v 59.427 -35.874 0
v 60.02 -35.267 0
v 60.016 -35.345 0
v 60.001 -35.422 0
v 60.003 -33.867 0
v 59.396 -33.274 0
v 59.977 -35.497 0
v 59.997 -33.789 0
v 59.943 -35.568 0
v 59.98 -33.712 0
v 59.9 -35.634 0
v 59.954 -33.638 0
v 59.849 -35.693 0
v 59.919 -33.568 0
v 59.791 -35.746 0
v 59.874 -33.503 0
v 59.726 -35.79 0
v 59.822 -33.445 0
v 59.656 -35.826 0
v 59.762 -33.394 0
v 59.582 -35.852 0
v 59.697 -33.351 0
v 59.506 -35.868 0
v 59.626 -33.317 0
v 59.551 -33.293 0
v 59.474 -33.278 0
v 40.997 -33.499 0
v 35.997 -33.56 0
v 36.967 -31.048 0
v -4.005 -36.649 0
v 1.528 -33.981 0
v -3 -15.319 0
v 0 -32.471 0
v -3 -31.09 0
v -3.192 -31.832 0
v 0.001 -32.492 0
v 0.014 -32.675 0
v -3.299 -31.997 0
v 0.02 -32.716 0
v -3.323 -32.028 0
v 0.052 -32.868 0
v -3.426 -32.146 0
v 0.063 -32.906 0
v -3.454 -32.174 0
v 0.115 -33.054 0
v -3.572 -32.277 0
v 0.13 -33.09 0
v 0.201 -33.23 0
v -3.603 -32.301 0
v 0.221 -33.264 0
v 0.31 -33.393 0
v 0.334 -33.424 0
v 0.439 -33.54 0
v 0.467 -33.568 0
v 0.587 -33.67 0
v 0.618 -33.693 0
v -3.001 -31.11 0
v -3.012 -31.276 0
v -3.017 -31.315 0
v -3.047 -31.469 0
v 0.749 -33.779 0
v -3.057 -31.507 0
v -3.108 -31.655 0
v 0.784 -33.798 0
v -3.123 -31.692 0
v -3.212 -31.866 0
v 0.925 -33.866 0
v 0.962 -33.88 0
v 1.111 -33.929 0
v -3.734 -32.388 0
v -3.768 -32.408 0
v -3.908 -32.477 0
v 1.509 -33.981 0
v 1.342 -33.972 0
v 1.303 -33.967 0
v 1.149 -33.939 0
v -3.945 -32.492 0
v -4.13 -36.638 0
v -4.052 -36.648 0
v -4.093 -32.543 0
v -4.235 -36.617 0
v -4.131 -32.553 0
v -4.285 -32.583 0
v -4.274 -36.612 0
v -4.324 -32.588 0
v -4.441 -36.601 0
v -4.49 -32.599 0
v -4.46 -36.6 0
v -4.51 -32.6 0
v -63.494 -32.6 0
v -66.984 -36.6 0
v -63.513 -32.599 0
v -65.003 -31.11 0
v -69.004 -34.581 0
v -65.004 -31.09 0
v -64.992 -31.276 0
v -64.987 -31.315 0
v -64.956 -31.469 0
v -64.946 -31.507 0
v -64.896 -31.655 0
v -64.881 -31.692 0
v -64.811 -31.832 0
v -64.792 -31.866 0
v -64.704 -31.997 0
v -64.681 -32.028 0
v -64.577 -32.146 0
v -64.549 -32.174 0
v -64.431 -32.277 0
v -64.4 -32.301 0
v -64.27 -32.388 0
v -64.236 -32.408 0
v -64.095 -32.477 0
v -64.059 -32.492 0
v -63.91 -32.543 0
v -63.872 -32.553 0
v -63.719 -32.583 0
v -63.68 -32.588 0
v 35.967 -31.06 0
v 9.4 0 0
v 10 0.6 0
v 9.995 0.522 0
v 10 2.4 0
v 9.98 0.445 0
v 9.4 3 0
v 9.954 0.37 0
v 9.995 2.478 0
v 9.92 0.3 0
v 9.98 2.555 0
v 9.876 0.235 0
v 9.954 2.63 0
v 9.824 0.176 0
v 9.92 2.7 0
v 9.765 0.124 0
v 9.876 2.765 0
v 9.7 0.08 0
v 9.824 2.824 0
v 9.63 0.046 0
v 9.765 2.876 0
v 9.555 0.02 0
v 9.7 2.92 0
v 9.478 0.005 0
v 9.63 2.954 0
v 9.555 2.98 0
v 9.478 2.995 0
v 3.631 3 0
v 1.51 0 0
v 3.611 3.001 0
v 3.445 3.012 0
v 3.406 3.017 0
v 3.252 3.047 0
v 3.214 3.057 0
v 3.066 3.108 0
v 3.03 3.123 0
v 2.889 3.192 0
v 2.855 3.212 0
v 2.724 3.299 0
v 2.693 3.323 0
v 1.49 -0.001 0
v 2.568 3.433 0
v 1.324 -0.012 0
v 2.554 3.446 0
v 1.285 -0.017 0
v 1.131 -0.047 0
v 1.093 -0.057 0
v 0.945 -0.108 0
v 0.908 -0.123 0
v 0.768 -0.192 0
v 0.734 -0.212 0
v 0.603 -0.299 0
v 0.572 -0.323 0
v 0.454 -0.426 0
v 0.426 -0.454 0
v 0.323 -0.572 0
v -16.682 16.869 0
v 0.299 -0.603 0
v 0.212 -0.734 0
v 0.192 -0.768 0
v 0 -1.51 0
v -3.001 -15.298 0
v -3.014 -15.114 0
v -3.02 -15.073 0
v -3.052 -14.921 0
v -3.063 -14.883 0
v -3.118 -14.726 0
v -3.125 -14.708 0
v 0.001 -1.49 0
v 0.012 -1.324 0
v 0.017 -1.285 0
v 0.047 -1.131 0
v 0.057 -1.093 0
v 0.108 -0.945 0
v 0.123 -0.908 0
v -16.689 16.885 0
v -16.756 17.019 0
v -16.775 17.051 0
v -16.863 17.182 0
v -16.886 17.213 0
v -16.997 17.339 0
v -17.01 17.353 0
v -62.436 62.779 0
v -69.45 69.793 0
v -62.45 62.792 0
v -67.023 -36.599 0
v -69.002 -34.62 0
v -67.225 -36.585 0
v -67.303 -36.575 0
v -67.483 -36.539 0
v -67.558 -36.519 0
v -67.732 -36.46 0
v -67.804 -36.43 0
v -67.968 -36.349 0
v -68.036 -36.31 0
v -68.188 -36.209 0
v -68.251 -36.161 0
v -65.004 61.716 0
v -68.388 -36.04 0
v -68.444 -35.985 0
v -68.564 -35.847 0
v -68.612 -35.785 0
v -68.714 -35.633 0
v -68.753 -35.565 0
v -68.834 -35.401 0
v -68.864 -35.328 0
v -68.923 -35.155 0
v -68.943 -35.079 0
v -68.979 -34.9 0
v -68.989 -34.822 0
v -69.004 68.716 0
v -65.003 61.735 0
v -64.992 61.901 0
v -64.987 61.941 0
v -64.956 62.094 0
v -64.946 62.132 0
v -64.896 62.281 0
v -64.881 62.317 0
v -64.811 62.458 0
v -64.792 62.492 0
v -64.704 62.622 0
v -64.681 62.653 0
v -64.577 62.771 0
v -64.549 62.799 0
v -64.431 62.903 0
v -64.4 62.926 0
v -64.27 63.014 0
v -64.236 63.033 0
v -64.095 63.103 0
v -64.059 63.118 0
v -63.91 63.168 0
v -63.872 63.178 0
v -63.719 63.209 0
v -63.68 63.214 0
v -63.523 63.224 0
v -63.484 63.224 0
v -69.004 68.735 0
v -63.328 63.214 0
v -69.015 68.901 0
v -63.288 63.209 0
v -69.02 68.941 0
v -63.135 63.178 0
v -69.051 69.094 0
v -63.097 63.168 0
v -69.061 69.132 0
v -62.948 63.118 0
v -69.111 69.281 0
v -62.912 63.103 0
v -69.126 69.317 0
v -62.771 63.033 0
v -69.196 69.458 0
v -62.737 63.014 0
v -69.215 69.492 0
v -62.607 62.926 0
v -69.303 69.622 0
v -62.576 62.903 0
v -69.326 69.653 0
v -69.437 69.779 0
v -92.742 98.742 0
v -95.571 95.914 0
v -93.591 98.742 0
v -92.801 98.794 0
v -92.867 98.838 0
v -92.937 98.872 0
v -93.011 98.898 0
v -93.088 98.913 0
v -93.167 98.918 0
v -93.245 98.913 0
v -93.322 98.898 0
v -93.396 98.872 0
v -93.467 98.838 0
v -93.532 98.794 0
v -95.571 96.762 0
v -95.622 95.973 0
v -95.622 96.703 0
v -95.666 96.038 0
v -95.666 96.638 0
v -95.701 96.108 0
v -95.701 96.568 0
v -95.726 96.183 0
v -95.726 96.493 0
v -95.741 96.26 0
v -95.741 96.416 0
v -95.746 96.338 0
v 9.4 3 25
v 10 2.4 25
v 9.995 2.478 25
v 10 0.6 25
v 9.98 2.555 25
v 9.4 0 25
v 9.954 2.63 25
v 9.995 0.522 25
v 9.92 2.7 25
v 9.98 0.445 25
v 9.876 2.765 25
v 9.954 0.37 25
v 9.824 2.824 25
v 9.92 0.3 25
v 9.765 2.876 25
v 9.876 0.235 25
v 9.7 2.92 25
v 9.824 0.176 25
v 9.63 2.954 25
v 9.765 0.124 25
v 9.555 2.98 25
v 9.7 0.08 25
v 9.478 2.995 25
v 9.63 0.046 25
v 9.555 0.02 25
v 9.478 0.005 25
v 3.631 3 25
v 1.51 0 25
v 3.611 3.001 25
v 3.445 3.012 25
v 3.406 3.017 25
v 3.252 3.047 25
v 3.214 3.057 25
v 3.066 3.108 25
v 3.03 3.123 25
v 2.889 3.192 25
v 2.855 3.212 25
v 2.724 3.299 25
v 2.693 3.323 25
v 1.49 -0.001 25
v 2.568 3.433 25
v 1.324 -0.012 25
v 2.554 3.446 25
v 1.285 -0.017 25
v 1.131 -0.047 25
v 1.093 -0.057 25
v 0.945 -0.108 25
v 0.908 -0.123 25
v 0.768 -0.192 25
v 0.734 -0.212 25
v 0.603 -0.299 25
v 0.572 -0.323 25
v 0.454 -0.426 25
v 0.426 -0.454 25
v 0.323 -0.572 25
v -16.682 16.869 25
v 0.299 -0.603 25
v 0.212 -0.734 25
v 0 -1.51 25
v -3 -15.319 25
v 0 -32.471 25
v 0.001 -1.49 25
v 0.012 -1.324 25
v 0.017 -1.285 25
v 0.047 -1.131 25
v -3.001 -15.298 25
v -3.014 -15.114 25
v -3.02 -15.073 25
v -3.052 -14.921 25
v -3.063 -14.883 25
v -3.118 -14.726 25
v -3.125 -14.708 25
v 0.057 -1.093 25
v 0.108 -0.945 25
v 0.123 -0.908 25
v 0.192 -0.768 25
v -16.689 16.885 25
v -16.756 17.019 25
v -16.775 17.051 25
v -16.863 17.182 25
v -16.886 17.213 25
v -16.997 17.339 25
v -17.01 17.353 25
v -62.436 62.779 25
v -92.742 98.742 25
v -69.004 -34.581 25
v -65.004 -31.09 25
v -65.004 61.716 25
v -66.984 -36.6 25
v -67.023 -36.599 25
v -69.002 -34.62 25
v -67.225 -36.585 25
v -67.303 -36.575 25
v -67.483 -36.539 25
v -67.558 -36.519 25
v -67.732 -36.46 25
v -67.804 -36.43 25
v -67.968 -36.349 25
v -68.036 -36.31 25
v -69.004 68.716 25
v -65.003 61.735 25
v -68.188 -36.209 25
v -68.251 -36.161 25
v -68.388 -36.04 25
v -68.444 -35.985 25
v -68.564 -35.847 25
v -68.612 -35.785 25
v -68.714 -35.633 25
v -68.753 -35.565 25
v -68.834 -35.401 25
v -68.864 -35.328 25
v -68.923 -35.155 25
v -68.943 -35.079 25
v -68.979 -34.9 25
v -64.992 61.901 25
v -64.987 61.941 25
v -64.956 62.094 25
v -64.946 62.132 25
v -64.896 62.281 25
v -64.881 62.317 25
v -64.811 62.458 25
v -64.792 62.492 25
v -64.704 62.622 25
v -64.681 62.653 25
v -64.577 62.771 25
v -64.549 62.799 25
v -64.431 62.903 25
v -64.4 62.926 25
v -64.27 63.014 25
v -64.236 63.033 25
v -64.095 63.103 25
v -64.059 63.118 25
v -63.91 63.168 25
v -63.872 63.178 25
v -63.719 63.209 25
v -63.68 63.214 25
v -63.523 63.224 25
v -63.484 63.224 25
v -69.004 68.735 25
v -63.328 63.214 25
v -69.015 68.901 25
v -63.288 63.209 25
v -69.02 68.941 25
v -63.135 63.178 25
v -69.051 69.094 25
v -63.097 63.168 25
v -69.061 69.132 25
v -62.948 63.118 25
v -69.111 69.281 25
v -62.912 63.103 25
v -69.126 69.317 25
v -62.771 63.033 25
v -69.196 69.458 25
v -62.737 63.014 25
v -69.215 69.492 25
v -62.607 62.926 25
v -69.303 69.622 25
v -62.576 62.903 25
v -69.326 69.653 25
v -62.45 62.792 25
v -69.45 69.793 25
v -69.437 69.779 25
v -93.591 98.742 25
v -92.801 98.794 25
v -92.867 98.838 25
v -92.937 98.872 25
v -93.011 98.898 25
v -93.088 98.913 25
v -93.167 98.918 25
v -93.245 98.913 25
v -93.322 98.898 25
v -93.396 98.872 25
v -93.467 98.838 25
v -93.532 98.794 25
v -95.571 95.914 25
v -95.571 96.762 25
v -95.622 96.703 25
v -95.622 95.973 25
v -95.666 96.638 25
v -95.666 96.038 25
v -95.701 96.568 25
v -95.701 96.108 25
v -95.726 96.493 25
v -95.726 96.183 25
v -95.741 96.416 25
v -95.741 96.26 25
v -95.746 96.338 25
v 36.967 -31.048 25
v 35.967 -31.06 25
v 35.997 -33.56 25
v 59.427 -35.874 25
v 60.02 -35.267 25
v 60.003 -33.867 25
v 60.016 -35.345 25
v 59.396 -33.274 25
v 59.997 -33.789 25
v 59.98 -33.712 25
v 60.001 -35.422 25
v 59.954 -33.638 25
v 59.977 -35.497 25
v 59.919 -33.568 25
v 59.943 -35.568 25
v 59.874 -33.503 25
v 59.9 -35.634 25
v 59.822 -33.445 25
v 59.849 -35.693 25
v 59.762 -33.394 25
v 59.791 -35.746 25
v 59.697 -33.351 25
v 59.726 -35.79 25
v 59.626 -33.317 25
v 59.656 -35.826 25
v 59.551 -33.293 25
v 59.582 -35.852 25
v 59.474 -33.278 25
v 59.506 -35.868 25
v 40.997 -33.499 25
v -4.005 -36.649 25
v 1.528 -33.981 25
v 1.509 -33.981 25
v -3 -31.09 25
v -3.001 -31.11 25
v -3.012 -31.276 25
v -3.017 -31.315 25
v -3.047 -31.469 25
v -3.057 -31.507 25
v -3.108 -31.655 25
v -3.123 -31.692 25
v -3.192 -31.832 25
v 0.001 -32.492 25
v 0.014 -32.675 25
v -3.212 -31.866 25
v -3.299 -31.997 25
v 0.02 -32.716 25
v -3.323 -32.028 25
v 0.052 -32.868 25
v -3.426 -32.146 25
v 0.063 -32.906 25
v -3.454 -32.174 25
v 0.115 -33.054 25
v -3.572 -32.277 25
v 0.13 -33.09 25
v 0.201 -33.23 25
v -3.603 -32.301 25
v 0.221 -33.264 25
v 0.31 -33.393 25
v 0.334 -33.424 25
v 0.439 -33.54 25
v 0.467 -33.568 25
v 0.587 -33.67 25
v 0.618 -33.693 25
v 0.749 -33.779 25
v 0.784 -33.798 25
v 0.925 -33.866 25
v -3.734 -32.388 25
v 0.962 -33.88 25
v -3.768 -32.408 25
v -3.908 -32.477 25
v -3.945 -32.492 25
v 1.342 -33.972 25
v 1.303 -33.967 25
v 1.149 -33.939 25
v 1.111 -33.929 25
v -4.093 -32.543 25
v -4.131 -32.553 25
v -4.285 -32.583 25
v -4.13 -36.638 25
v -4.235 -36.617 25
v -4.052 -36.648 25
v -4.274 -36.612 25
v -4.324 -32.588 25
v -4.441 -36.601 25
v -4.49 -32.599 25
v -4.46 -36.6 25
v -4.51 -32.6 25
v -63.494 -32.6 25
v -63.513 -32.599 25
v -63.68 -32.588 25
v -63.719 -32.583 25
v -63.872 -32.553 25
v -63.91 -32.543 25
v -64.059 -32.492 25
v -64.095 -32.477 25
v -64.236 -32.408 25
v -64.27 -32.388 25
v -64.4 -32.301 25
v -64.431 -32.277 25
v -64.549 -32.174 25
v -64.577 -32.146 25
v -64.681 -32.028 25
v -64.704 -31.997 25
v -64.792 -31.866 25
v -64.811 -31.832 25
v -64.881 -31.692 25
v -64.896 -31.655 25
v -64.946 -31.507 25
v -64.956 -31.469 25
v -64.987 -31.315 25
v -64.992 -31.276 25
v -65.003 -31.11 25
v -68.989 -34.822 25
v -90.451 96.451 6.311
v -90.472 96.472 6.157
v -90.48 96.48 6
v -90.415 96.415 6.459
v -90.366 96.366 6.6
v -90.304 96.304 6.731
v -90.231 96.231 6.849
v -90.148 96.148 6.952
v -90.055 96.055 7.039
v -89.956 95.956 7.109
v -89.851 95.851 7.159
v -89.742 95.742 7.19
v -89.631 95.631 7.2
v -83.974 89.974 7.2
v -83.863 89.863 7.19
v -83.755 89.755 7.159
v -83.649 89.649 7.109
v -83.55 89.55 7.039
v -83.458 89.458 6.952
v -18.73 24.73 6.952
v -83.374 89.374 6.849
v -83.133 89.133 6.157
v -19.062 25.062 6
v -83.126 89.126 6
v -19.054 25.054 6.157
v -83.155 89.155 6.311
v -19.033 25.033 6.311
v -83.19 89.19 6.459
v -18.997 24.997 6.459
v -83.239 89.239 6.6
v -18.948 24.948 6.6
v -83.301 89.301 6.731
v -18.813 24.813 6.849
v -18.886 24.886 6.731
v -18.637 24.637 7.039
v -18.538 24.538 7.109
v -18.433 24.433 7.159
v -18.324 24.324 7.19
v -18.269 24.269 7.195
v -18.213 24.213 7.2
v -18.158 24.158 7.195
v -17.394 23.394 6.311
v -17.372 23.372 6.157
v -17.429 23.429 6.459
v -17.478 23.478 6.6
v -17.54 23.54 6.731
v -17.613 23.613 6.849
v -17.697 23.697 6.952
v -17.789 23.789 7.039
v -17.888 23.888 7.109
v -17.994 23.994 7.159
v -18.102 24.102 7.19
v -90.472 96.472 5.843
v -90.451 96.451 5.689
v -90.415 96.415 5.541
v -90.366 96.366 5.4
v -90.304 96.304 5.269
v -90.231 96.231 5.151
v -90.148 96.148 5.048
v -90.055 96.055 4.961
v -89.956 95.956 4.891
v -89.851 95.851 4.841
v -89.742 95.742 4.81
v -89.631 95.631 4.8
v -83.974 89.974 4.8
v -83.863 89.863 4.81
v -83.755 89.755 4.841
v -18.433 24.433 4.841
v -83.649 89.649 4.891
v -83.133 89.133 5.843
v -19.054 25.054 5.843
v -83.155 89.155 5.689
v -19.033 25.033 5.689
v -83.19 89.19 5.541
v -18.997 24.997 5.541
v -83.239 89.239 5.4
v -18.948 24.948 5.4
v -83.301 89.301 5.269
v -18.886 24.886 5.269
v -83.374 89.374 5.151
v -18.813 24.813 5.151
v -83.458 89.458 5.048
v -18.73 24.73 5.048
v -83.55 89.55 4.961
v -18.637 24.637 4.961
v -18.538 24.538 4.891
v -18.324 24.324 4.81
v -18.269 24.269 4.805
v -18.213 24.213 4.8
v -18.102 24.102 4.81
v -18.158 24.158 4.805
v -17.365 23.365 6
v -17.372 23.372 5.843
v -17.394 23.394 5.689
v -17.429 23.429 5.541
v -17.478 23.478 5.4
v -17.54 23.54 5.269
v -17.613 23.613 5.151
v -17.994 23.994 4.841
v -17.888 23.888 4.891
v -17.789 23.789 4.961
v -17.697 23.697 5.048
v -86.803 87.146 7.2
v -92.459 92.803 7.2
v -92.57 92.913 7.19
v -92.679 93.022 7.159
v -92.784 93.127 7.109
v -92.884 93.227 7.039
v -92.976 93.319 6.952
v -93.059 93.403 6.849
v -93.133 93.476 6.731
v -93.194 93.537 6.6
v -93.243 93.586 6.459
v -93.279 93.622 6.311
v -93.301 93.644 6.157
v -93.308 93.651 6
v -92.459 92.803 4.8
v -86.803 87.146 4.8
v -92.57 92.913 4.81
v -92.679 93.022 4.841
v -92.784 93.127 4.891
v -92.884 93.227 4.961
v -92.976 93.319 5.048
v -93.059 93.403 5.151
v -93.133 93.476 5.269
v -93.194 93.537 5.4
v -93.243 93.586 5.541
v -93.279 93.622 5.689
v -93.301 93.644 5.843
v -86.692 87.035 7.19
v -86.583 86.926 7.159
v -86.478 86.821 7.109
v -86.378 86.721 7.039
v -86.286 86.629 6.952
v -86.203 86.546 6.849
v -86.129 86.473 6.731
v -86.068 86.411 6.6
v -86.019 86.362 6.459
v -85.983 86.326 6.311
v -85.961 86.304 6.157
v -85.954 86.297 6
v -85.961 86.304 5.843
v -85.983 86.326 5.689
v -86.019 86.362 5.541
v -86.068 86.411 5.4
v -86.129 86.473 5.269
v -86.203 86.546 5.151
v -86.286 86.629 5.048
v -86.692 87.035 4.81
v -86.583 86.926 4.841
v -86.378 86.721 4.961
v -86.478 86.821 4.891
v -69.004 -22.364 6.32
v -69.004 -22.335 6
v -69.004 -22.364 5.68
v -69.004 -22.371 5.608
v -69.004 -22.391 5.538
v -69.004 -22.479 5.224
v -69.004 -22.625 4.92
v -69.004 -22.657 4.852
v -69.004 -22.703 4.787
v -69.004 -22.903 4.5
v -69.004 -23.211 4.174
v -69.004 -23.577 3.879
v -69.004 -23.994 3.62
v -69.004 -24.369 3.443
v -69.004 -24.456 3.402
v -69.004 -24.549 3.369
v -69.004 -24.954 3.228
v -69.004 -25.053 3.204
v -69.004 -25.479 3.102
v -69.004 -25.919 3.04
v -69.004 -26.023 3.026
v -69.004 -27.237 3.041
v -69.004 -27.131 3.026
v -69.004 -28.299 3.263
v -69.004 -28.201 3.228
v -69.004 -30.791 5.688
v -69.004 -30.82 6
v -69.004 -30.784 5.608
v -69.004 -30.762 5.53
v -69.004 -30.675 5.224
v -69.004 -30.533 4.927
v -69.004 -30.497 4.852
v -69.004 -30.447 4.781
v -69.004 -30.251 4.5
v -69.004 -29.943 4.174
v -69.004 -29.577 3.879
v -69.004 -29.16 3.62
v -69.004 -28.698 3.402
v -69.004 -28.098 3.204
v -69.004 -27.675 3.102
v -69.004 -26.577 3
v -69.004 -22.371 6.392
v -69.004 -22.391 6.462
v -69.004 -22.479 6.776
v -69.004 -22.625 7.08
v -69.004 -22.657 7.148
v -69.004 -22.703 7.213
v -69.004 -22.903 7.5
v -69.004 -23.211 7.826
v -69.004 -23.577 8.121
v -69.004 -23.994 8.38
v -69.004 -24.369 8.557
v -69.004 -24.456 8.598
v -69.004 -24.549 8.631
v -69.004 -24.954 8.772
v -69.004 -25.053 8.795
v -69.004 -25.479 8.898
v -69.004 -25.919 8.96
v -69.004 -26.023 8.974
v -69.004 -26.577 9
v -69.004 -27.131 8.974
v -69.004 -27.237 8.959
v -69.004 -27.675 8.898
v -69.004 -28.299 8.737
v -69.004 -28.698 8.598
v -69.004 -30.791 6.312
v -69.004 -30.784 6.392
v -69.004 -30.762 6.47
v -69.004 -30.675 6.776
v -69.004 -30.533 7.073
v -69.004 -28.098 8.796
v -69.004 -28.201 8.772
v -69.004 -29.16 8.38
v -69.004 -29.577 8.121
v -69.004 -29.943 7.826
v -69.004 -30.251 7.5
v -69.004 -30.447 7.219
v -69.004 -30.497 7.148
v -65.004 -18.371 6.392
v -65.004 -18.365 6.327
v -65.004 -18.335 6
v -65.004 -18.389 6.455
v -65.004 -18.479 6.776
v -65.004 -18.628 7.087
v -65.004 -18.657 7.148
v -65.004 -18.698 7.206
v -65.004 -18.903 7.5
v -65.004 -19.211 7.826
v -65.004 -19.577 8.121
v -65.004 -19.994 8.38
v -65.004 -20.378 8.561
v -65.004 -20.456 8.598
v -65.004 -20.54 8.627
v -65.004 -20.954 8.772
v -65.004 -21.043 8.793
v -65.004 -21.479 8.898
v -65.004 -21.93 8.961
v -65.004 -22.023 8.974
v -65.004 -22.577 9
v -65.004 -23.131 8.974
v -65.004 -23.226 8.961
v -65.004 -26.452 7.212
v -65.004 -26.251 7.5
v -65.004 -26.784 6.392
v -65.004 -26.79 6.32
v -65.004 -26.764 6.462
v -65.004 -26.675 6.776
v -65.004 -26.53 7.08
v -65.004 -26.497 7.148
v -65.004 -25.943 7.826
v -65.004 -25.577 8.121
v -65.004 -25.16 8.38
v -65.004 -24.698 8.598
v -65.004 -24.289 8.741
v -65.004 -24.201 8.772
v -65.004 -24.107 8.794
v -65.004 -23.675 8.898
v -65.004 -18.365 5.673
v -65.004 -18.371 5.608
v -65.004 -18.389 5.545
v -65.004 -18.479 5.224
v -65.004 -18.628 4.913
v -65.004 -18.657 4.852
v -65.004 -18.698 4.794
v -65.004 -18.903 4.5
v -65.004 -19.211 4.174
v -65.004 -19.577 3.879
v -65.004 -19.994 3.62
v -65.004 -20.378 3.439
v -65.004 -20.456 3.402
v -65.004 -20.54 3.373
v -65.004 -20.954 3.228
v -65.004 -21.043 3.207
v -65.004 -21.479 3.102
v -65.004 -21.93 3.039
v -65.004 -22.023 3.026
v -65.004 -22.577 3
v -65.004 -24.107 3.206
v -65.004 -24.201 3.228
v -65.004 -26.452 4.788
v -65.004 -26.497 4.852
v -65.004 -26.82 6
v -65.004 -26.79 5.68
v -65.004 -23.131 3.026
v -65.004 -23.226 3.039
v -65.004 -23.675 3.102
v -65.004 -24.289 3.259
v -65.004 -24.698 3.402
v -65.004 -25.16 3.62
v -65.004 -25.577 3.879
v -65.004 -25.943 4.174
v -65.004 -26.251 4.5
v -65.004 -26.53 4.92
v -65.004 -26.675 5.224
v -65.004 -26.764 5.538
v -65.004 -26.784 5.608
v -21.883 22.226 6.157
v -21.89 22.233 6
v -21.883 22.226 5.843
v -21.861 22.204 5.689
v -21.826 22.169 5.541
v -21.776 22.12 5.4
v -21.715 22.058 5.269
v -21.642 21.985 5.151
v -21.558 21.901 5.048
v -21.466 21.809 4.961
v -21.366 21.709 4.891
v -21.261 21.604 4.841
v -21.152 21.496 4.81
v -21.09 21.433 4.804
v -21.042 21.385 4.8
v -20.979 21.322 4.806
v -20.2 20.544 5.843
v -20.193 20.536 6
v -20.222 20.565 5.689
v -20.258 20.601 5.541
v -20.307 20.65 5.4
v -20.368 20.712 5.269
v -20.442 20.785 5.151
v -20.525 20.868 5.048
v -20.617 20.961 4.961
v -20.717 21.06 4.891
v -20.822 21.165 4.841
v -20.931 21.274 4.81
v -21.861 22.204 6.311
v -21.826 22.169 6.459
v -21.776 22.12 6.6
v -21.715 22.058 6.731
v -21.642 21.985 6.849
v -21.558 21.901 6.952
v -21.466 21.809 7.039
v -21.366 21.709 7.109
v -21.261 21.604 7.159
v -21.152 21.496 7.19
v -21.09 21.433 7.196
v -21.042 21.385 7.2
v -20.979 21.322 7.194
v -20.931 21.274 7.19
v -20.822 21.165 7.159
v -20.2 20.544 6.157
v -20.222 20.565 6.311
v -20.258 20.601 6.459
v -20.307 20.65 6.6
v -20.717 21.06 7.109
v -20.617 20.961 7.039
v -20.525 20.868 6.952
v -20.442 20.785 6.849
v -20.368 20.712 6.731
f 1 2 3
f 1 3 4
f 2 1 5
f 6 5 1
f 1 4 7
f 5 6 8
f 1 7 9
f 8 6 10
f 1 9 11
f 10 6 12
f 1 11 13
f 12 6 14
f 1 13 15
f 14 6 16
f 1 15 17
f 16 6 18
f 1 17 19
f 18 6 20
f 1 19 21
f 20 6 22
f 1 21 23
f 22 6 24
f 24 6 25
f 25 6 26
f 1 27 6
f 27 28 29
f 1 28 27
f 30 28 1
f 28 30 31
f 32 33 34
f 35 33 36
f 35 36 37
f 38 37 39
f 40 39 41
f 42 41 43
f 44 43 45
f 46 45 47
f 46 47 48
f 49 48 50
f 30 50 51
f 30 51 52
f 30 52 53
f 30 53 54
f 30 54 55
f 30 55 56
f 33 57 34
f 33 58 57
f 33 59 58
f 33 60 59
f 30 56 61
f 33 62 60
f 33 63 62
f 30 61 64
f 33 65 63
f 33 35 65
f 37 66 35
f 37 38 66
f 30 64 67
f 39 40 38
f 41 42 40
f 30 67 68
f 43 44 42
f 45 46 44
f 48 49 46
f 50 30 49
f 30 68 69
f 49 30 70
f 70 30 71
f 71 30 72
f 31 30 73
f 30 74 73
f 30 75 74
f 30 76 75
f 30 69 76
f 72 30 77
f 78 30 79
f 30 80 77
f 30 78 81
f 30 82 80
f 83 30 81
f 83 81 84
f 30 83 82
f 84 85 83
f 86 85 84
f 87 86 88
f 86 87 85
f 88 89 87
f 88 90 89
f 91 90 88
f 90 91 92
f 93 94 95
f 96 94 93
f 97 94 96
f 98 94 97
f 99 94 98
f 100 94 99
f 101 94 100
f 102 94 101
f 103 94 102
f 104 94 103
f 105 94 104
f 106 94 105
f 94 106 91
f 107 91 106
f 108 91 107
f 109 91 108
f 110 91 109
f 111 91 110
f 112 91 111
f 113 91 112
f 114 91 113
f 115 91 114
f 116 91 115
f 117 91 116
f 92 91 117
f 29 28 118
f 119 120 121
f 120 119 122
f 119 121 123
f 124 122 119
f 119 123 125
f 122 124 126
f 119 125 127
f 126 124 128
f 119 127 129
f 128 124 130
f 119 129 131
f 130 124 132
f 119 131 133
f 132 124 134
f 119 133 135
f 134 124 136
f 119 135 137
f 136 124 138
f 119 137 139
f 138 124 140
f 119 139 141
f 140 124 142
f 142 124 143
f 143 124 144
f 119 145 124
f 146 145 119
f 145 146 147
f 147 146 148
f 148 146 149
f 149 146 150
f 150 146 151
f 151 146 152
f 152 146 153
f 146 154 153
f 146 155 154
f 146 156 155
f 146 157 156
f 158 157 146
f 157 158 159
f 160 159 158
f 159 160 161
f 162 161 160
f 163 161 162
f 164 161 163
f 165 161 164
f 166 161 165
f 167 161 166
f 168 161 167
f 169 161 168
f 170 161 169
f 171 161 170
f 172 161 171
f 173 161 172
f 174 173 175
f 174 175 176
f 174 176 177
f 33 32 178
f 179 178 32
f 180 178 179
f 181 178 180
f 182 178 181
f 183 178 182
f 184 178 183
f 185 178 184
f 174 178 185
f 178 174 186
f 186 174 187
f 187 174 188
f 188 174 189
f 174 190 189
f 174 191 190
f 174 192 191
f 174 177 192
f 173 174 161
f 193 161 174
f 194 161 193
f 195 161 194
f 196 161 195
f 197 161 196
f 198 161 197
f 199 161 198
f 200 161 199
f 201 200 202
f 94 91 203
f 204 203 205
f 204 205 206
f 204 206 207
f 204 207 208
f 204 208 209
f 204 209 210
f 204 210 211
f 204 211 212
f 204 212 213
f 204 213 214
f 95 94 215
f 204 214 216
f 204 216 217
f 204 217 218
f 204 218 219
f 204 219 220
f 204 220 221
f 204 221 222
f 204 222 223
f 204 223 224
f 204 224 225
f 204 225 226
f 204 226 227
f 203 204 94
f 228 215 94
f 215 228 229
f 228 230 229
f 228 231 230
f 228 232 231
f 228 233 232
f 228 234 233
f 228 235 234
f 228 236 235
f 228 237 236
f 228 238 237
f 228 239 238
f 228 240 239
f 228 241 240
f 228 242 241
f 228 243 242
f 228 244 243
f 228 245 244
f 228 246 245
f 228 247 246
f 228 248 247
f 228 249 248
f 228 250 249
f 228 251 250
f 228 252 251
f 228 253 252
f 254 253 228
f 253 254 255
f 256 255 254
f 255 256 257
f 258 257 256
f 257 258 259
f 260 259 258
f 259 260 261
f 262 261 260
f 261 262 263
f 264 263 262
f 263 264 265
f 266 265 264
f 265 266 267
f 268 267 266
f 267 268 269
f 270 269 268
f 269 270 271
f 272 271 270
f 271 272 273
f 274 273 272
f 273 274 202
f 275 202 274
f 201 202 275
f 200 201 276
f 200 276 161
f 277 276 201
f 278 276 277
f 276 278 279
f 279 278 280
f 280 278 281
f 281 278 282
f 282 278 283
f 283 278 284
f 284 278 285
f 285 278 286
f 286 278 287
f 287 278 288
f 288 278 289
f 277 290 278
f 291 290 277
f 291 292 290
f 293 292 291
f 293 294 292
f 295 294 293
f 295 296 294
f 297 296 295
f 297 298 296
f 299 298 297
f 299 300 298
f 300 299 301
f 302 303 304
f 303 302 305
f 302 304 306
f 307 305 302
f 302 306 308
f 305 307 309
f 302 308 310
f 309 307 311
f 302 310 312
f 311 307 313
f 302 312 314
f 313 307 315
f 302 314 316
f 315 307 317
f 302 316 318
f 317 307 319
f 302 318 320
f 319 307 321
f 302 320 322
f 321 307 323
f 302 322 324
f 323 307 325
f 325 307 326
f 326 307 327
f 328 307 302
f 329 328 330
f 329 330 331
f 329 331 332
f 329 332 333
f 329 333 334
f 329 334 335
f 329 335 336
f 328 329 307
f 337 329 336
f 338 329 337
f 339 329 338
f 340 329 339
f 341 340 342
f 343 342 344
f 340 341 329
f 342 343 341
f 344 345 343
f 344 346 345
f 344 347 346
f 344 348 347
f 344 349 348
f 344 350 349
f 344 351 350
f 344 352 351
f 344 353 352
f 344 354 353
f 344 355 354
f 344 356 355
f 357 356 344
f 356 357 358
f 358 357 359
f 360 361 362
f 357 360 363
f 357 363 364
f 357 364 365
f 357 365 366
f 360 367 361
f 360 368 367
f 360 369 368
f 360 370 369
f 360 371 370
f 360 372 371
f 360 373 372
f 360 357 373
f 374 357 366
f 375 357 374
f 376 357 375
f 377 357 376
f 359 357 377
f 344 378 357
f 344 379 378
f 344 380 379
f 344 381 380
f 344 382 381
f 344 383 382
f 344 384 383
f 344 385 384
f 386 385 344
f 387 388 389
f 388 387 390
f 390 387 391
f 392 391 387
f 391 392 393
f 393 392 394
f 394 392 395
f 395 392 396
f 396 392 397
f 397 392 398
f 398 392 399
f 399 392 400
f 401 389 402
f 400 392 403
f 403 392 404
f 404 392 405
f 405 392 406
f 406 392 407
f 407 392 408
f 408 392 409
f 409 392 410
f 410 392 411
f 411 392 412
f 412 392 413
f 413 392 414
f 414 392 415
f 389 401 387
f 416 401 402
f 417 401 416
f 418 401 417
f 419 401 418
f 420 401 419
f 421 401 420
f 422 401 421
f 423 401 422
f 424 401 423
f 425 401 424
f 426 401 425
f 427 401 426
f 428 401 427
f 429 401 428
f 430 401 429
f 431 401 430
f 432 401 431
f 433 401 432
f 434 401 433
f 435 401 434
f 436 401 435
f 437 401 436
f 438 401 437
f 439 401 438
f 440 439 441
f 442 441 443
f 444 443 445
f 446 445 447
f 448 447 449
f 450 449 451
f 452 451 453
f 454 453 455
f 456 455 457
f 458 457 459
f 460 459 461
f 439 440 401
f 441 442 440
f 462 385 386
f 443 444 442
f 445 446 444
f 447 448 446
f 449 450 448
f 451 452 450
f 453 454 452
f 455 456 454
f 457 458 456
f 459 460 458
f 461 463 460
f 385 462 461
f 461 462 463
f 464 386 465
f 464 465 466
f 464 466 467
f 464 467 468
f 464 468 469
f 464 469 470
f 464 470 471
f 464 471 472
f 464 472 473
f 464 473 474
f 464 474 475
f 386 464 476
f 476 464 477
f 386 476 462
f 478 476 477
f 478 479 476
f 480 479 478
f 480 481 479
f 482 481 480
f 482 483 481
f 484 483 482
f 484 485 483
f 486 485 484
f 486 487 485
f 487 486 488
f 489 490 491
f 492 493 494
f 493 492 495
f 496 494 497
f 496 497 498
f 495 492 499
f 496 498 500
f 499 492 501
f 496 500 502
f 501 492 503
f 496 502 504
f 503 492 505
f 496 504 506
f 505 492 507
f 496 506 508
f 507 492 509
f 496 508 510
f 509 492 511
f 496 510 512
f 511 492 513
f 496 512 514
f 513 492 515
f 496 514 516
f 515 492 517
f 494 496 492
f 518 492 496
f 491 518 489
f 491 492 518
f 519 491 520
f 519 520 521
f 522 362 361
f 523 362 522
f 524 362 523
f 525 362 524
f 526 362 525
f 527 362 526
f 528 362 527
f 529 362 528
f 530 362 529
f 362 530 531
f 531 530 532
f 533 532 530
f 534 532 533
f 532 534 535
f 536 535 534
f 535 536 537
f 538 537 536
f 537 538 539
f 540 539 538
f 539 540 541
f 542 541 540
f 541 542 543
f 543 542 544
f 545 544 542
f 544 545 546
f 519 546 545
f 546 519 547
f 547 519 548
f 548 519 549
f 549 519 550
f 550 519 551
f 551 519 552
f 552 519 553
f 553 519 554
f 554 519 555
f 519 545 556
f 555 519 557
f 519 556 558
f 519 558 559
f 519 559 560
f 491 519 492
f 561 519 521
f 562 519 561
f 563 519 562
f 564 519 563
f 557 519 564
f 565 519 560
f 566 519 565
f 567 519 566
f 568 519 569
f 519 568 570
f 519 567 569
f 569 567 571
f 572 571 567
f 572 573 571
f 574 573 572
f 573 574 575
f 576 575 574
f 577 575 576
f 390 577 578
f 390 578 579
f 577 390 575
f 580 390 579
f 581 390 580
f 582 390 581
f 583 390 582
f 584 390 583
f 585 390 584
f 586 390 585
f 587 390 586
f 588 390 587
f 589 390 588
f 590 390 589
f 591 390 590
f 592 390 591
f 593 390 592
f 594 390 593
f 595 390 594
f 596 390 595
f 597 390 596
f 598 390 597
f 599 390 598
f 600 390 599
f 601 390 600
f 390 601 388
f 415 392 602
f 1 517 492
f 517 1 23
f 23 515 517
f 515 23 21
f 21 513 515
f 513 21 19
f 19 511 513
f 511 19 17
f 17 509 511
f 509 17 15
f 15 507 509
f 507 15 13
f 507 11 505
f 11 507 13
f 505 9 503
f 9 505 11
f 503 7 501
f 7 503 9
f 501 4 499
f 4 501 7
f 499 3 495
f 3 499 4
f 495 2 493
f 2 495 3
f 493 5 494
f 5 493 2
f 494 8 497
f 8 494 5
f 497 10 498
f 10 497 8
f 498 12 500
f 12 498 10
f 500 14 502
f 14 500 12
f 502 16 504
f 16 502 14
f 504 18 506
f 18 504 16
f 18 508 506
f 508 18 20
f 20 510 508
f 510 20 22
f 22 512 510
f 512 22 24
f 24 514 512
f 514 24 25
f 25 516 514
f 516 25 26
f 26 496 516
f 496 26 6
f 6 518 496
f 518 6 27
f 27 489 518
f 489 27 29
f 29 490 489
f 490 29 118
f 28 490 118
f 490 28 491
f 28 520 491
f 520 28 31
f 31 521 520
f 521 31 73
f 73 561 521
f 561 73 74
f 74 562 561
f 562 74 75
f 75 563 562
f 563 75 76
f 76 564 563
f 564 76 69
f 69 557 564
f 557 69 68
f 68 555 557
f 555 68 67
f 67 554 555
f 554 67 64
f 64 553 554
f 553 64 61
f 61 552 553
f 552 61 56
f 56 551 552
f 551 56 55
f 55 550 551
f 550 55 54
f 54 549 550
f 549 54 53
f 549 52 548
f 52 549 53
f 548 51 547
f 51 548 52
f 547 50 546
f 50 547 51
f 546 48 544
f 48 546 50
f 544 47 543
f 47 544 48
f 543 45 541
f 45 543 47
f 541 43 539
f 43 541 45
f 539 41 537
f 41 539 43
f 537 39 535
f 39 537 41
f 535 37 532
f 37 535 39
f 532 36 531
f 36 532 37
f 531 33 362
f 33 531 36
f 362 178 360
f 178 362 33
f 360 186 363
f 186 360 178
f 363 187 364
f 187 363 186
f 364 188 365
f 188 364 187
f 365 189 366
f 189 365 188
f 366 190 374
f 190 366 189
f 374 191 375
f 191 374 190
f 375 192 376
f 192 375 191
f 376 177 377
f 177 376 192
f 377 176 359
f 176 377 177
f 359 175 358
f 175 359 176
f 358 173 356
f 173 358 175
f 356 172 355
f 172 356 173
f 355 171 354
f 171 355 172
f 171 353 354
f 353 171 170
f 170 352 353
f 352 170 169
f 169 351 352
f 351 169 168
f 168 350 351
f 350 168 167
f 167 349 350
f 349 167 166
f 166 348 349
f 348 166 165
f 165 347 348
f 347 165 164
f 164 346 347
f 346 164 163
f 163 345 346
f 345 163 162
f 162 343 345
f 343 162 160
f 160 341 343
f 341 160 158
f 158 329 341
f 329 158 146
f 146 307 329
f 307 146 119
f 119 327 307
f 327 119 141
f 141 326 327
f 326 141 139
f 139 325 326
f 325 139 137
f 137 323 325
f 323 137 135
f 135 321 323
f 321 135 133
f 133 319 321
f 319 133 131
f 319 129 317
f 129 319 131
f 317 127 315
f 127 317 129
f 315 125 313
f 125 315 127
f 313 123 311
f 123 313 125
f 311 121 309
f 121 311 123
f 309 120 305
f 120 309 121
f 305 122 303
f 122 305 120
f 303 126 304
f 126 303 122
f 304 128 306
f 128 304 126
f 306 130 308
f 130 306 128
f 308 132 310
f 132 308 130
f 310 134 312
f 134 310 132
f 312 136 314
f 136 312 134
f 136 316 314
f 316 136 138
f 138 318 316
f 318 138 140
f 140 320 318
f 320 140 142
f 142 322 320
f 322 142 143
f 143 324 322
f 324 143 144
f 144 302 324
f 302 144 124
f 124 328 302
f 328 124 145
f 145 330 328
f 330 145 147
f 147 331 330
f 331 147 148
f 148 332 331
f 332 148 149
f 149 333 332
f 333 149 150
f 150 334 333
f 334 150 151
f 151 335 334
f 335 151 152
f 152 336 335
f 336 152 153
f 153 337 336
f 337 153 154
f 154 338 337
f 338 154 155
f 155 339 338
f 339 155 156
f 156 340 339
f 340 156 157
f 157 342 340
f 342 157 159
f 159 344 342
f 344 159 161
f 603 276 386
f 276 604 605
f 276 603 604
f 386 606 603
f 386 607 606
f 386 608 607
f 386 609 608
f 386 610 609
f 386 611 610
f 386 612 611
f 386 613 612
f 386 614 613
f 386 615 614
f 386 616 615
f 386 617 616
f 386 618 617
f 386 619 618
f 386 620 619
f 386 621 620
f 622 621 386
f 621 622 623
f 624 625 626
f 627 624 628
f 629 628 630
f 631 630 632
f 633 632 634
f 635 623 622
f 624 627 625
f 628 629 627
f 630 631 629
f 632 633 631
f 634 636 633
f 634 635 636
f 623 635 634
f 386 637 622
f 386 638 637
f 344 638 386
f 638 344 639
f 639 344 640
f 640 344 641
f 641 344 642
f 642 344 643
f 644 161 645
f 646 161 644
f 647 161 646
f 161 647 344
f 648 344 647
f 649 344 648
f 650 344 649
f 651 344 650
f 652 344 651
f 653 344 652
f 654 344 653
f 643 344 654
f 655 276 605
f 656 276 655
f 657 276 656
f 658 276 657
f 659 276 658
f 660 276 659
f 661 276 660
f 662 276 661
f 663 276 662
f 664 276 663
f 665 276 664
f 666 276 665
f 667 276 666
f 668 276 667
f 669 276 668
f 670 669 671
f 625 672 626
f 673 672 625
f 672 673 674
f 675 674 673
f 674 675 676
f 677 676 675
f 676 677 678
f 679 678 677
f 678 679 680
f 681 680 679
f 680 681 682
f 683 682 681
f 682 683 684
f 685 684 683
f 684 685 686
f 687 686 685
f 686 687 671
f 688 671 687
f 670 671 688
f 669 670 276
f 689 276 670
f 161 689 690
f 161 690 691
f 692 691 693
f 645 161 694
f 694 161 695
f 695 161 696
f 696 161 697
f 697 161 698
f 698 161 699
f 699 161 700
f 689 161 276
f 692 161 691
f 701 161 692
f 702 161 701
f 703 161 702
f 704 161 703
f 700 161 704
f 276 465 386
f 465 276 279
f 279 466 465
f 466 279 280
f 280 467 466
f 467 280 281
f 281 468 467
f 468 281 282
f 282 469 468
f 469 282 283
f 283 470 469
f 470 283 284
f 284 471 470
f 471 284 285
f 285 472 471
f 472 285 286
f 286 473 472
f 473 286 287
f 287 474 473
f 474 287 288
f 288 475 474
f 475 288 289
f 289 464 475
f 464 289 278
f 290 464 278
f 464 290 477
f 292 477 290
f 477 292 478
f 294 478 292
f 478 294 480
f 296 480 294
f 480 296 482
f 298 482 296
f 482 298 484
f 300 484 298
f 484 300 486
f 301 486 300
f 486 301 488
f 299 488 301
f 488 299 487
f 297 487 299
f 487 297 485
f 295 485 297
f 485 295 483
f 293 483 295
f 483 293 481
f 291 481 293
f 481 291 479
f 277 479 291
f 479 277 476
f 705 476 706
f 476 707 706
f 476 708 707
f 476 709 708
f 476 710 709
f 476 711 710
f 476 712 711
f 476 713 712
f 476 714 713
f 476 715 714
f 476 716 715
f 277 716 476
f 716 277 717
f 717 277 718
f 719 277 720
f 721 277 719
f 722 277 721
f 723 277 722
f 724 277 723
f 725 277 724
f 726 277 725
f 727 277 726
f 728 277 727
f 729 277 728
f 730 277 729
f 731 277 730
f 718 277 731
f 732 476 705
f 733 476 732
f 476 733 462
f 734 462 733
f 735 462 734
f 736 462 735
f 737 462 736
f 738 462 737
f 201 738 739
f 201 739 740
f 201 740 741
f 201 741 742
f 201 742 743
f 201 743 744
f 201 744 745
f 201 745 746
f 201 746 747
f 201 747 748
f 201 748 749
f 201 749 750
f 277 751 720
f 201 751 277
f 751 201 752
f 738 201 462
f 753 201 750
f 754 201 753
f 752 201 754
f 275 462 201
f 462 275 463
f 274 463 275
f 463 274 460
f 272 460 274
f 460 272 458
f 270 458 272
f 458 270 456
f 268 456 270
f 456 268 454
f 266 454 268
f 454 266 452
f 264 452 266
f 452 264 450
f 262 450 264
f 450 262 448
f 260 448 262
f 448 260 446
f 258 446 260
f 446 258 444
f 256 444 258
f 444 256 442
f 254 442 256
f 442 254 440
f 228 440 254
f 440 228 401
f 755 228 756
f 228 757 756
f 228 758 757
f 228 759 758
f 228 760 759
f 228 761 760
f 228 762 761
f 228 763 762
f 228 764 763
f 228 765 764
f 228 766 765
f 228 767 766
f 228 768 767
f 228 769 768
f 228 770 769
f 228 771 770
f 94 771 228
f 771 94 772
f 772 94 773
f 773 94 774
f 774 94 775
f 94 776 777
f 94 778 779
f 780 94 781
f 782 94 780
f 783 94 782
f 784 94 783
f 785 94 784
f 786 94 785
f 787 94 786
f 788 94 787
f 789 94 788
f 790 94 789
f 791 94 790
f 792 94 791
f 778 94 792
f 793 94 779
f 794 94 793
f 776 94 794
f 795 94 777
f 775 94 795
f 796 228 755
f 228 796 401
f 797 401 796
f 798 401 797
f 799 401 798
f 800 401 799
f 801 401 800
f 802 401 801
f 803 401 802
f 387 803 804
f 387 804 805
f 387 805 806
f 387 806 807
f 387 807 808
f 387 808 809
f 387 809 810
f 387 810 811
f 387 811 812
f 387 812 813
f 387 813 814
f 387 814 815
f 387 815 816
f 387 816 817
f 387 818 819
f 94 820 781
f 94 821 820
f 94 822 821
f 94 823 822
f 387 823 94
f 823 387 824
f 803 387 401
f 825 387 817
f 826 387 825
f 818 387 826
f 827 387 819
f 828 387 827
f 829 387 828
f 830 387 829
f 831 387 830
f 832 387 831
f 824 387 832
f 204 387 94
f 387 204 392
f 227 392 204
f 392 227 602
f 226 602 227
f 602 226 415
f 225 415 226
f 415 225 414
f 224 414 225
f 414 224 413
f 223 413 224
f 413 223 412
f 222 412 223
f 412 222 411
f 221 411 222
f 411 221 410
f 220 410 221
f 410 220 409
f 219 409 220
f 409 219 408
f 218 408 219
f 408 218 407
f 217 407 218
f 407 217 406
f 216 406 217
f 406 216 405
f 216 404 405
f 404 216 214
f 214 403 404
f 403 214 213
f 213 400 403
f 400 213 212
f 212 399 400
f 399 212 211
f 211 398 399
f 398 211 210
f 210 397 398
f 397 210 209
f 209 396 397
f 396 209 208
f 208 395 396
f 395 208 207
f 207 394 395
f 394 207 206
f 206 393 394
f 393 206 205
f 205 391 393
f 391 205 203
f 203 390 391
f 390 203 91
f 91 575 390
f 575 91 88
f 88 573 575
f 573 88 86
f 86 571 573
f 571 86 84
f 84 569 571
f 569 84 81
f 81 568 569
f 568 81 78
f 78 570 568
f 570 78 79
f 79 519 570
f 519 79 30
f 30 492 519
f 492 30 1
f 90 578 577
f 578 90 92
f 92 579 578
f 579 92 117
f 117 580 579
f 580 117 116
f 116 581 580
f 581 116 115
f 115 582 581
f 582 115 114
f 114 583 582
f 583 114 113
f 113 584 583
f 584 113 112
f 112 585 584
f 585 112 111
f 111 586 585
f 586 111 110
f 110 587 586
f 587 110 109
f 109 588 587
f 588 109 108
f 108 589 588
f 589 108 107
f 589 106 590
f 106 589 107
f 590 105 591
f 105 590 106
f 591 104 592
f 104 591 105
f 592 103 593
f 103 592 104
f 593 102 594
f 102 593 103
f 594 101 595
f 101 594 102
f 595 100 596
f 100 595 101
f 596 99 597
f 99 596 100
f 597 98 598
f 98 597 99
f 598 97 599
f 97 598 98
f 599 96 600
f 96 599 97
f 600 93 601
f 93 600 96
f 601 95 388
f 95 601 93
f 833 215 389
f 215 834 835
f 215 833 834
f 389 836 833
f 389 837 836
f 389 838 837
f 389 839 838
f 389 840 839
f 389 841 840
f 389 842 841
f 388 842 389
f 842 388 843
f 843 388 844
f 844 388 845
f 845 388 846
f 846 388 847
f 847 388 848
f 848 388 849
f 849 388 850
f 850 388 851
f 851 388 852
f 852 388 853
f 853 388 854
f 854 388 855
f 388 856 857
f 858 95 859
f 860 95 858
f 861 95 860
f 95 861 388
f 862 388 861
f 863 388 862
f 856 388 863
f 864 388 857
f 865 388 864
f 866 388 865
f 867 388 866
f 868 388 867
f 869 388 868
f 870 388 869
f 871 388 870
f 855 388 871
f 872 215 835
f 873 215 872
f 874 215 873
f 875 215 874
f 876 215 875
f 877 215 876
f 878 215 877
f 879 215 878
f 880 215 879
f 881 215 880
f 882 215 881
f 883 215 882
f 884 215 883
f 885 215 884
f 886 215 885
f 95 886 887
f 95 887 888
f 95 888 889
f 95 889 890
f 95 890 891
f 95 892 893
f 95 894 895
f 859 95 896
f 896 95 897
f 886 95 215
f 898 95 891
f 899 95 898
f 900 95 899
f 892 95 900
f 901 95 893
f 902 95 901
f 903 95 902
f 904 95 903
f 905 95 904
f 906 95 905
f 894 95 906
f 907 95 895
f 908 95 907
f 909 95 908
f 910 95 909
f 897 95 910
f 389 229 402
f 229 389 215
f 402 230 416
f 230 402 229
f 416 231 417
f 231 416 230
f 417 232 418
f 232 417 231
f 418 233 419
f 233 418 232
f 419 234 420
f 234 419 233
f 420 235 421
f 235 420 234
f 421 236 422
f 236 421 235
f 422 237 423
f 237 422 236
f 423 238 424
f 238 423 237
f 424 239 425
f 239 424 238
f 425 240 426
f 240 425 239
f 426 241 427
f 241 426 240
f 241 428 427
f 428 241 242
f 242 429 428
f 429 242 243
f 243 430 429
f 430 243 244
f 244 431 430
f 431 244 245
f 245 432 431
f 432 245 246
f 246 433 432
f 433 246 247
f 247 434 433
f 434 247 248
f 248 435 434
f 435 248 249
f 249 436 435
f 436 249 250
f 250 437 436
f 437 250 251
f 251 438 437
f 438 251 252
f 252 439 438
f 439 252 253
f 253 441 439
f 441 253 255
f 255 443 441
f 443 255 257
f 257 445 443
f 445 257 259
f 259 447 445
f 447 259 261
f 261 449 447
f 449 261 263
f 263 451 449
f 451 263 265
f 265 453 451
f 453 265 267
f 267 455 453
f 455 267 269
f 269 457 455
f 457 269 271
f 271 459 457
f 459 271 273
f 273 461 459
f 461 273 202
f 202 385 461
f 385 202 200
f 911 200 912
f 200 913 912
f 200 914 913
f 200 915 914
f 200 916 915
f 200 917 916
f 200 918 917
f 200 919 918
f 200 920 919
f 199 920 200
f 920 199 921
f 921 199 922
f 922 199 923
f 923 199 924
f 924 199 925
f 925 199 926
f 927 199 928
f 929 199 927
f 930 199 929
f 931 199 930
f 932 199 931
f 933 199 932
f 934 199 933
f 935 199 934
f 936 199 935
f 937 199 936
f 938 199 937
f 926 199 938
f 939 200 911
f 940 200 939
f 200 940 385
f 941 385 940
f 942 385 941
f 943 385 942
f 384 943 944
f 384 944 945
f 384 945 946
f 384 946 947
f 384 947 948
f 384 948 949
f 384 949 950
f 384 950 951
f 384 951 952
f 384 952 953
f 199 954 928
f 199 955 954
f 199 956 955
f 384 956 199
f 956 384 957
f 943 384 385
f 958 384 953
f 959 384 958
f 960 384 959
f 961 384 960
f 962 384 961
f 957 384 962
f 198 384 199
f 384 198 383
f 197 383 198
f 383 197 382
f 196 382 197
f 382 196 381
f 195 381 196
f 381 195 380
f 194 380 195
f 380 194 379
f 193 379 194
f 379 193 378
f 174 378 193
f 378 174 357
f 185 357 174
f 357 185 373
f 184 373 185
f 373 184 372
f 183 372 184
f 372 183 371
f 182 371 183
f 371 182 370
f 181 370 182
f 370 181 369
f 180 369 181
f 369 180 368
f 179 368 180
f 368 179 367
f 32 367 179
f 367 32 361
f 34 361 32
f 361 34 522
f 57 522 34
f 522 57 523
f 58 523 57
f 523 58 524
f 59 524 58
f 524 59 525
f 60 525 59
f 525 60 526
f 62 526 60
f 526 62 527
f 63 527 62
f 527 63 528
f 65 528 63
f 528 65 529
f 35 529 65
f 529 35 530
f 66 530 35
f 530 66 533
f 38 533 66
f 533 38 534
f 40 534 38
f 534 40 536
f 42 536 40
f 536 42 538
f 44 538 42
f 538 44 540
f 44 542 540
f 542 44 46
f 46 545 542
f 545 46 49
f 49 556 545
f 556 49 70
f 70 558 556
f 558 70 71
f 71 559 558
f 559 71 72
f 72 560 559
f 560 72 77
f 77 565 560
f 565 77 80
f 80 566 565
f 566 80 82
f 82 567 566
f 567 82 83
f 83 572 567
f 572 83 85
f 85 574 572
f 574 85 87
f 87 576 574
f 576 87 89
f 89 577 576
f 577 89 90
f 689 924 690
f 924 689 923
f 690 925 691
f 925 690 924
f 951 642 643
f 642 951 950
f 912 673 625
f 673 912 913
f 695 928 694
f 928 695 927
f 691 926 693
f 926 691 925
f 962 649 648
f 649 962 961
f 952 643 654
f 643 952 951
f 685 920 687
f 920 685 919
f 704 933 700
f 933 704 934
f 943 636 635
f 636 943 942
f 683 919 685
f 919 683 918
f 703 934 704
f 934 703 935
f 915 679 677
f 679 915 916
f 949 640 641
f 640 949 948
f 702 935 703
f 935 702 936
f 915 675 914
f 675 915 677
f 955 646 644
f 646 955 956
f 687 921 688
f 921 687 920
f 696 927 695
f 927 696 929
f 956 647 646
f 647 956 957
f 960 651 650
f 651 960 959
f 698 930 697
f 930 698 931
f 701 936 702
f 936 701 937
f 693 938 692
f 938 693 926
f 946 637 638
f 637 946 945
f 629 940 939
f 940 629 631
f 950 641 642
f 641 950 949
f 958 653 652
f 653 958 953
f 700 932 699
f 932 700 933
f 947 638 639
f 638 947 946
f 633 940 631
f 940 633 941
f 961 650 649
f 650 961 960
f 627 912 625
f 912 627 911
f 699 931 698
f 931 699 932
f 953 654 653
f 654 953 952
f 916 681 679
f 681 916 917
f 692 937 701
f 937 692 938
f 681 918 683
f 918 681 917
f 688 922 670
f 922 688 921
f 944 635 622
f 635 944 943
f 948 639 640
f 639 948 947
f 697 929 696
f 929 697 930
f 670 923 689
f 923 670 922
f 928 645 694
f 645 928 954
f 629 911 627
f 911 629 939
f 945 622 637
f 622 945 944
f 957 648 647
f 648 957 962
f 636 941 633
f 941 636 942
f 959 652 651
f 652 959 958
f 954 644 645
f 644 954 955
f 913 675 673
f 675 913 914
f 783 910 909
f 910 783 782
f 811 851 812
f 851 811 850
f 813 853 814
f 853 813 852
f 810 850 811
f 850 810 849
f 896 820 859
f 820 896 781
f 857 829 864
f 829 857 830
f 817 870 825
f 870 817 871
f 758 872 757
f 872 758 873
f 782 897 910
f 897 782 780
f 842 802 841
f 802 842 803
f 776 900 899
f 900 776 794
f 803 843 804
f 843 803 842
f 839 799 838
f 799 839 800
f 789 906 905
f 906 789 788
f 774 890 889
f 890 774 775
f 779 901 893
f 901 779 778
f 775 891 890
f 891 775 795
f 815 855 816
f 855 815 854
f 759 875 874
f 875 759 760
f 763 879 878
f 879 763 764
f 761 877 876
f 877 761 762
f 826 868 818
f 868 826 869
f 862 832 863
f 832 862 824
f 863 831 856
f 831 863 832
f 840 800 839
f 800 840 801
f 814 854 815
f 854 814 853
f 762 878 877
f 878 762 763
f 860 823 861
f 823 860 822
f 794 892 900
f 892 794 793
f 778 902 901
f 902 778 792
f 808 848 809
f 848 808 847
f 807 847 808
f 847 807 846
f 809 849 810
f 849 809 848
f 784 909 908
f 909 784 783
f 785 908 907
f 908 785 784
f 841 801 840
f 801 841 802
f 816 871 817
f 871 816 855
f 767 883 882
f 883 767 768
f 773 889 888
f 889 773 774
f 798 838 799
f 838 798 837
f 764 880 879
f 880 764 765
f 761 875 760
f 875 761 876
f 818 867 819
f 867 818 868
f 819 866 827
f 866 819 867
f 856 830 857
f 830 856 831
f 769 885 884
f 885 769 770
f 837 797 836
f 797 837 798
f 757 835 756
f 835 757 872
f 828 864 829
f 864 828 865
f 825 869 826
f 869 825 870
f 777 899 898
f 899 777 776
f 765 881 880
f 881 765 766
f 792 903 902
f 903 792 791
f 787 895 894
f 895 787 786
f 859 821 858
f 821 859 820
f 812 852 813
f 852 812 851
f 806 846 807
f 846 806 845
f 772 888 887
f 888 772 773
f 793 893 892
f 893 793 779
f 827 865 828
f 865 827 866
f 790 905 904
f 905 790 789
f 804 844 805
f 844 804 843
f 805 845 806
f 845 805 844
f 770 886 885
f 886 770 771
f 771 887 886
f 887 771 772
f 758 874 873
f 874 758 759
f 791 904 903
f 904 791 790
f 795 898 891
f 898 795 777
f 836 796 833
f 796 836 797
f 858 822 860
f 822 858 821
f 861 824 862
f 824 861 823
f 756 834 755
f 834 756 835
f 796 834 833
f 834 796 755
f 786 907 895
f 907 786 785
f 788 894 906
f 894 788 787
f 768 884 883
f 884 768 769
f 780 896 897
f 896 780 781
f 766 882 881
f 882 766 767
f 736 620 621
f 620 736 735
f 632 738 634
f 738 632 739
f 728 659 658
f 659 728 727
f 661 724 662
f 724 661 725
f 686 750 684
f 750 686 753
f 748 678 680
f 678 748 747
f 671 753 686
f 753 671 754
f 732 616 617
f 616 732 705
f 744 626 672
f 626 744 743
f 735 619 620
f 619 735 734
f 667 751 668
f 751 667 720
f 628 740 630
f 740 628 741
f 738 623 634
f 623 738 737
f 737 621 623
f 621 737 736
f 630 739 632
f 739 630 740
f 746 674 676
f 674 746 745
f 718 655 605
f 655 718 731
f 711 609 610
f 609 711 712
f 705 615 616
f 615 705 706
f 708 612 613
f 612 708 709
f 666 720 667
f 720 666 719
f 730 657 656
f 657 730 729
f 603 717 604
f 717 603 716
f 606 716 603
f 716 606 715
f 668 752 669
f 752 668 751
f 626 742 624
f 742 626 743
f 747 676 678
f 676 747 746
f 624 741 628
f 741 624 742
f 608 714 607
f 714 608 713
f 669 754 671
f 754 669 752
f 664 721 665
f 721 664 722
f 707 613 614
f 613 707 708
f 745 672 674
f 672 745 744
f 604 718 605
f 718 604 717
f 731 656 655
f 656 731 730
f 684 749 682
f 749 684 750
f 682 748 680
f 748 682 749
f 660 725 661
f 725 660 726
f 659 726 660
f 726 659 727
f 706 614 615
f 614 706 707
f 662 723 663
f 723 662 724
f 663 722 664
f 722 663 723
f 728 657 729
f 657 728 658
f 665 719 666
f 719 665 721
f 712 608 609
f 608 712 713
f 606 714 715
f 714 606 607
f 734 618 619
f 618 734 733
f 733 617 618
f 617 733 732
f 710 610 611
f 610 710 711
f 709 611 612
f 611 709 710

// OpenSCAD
// Clip: holds the Guition JC1060P470C (ESP32-P4, 7 inch, in its case) on the rear edge of the M-Vave SMK-37.
// Each clip is screwed to 2 of the 4 brass threaded posts on the back of the screen (one low, one high).
// Print 2 clips: clip A (side = 0) and clip B (side = 1), one for each pair of posts. The holes are 6 mm from
// one side edge, so A and B are mirror parts. Print the test slice first (part = 1).
// The part is a 2D profile (X = depth, +X to the player; Y = up), extruded along Z, then drilled.
// So the STL already lies on its side: the layers follow the C shape. No supports.
//
// STATUS (2026-11-23): the user printed clip A and clip B with these values and the fit is good
// (keyboard jaw, hook, screw holes, 45 degree tilt, foot). Values marked GUESS below are now confirmed by that print.
//
// SIZES AND SOURCES (2026-11-22), from before the test prints:
//   Screen plate 181.80 x 113.72 mm: manuals.plus/ae/1005010748515638 (seller manual).
//   The 4 posts are near the corners of that plate (the user's photo). Their spacing and thread are GUESSES.
//   SMK-37 about 480 x 210 x 72 mm overall (knobs included): equipboard.com (not from M-Vave).
//   No source gives the SMK-37 rear edge shape. Values marked GUESS must be checked with the test slice.

part = 0;            // 0 = full clip, 1 = thin test slice
side = 0;            // full clip only: 0 = clip A, 1 = clip B (the mirror of A). Print one of each.
hole_edge = 6;       // the screw holes are this far from one side edge of the clip (the user asked for 6)

// ---- keyboard (SMK-37) ----
kb_rear_h  = 34.0;   // jaw opening. The user measured 34.5 (2026-11-22), then asked for 0.5 less after a test print.
kb_top_reach = 10;   // top tongue length (15 was 5 too long: the user's test print). The deck is free for only 3 mm (measured), then the knobs start:
                     // put each clip where no knob is in the way
kb_lip_len = 60;     // bottom tongue length (the user asked: long below, shorter on top)
lip_t      = 2.6;    // bottom tongue thickness (3 was 0.4 too thick: the user's test print)
pinch      = 0.7;    // degrees: the bottom tongue points up, so the jaw is a spring clamp (0 = no grip)
                     // 2 degrees (tip 2.1 mm high) was too tight in the user's test print: the back plate bowed.
                     // The rear of the keyboard is flat (user), so the grip is the pinch and the hook.
hook_x     = 36;     // steep face of the hook, from the rear edge. 31 was 5 mm too near (the user's test print)
hook_h     = 2.5;    // hook height (the user asked for 2.5). 0 = no hook
hook_len   = 5;      // GUESS: hook length (1 mm flat top, then a ramp to the tip side)

// ---- screen (JC1060P470C): the posts on its back ----
screw_d    = 2.4;    // hole for an M2 screw (the user checked the thread: M2)
post_gap_min = 93;   // GUESS: the low post to the high post is about 102 mm, centre to centre.
post_gap_max = 101;  //        The top hole is a slot from min to max, so 93 to 101 mm fits.
arm_top    = 5;      // arm length above the end of the slot. The arm end is now 6 mm lower than in the last
                     // print (the user: "top is still 6 mm too long"). The low hole is confirmed good.

// ---- foot behind the keyboard (the user: the clip alone is not sturdy enough for the screen) ----
strut_v    = 97;     // where the strut meets the arm, along the arm from the deck (must stay below the slot)
strut_t    = 4;      // strut and foot thickness
foot_drop  = 0;      // GUESS: foot bottom, below the bottom of the tongue. 0 = same level as the tongue.
                     // Make it bigger if the foot does not touch the table.
access_d   = 6;      // hole through the strut for the screwdriver (low screw)
lift       = 30;     // GUESS: low post height above the deck, along the arm (screen must clear the knobs)
tilt       = 45;     // screen leans back this many degrees from vertical (the user asked for 45)
arm_t      = 4;      // arm thickness
arm_x      = 3;      // front face of the arm at the deck, measured from the rear edge to the player

// ---- print ----
wall    = 3;         // wall thickness of the jaw
clip_w  = 25;        // width of one clip
test_w  = 10;        // width of the test slice
fillet  = 1.5;       // inside corner radius (stops cracks at the jaw)
round_r = 0.6;       // outside corner radius

$fn = 48;
arm_len = lift + post_gap_max + arm_top;
w = part == 0 ? clip_w : test_w;

module jaw() {
    bottom = -kb_rear_h - lip_t;
    translate([-wall, bottom]) square([wall, wall - bottom]);              // back plate
    translate([-wall, 0]) square([kb_top_reach + wall, wall]);             // top tongue (rests on the deck)
    translate([0, -kb_rear_h]) rotate(pinch)                               // bottom tongue, tip points up
        translate([-wall, -lip_t]) square([kb_lip_len + wall, lip_t]);
}

module arm_frame() { translate([arm_x, wall]) rotate(tilt) children(); }   // u = out of the arm face, v = up the arm

module arm() {
    intersection() {                                                       // never below the deck plane
        arm_frame() translate([-arm_t, -10]) square([arm_t, arm_len + 10]);
        translate([-500, 0]) square(1000);
    }
    difference() {
        hull() {                                                           // brace behind the arm, down the back plate
            arm_frame() translate([-arm_t, 0]) square([arm_t, lift - 6]); // stops below the low screw head
            translate([-wall, -15]) square([wall, 15 + wall]);
        }
        translate([0, -500]) square(500);                                  // the brace must not enter the jaw (was a bug)
    }
}

module bar(p, q, t) { hull() { translate(p) circle(d = t); translate(q) circle(d = t); } }

module foot() {                                     // a foot on the table, and a strut from it up to the arm
    px = arm_x + (-arm_t / 2) * cos(tilt) - strut_v * sin(tilt);            // the point on the arm
    py = wall  + (-arm_t / 2) * sin(tilt) + strut_v * cos(tilt);
    fy = -kb_rear_h - lip_t - foot_drop + strut_t / 2;                      // centre line of the foot
    bar([-wall / 2, fy], [px, fy], strut_t);                                // foot, from the back plate to the rear
    bar([px, fy], [px, py], strut_t);                                       // strut, straight up to the arm
    if (foot_drop > 0) bar([-wall / 2, fy], [-wall / 2, -kb_rear_h], wall); // join a lower foot to the back plate
}

module profile() {
    offset(r = round_r) offset(r = -round_r)        // round the outside corners
    offset(r = -fillet) offset(delta = fillet)      // fill the inside corners
    union() { jaw(); arm(); foot(); }
    if (hook_h > 0)                                // hook: after the fillets, so its rear face stays steep
        translate([0, -kb_rear_h]) rotate(pinch)
            polygon([[hook_x, -1], [hook_x, hook_h], [hook_x + 1, hook_h], [hook_x + hook_len, 0], [hook_x + hook_len, -1]]);
}

module hole(v) {                                    // screw hole through the arm, at height v along the arm
    translate([0, 0, part == 1 ? w / 2 : (side == 0 ? hole_edge : w - hole_edge)]) arm_frame() translate([0, v, 0])
        rotate([0, 90, 0]) cylinder(d = screw_d, h = 60, center = true);
}

difference() {
    linear_extrude(height = w) profile();
    hole(lift);                                                            // low post
    translate([0, 0, part == 1 ? w / 2 : (side == 0 ? hole_edge : w - hole_edge)])   // screwdriver access
        arm_frame() translate([-arm_t - 10, lift, 0]) rotate([0, -90, 0]) cylinder(d = access_d, h = 300);
    hull() { hole(lift + post_gap_min); hole(lift + post_gap_max); }       // high post (slot)
}
